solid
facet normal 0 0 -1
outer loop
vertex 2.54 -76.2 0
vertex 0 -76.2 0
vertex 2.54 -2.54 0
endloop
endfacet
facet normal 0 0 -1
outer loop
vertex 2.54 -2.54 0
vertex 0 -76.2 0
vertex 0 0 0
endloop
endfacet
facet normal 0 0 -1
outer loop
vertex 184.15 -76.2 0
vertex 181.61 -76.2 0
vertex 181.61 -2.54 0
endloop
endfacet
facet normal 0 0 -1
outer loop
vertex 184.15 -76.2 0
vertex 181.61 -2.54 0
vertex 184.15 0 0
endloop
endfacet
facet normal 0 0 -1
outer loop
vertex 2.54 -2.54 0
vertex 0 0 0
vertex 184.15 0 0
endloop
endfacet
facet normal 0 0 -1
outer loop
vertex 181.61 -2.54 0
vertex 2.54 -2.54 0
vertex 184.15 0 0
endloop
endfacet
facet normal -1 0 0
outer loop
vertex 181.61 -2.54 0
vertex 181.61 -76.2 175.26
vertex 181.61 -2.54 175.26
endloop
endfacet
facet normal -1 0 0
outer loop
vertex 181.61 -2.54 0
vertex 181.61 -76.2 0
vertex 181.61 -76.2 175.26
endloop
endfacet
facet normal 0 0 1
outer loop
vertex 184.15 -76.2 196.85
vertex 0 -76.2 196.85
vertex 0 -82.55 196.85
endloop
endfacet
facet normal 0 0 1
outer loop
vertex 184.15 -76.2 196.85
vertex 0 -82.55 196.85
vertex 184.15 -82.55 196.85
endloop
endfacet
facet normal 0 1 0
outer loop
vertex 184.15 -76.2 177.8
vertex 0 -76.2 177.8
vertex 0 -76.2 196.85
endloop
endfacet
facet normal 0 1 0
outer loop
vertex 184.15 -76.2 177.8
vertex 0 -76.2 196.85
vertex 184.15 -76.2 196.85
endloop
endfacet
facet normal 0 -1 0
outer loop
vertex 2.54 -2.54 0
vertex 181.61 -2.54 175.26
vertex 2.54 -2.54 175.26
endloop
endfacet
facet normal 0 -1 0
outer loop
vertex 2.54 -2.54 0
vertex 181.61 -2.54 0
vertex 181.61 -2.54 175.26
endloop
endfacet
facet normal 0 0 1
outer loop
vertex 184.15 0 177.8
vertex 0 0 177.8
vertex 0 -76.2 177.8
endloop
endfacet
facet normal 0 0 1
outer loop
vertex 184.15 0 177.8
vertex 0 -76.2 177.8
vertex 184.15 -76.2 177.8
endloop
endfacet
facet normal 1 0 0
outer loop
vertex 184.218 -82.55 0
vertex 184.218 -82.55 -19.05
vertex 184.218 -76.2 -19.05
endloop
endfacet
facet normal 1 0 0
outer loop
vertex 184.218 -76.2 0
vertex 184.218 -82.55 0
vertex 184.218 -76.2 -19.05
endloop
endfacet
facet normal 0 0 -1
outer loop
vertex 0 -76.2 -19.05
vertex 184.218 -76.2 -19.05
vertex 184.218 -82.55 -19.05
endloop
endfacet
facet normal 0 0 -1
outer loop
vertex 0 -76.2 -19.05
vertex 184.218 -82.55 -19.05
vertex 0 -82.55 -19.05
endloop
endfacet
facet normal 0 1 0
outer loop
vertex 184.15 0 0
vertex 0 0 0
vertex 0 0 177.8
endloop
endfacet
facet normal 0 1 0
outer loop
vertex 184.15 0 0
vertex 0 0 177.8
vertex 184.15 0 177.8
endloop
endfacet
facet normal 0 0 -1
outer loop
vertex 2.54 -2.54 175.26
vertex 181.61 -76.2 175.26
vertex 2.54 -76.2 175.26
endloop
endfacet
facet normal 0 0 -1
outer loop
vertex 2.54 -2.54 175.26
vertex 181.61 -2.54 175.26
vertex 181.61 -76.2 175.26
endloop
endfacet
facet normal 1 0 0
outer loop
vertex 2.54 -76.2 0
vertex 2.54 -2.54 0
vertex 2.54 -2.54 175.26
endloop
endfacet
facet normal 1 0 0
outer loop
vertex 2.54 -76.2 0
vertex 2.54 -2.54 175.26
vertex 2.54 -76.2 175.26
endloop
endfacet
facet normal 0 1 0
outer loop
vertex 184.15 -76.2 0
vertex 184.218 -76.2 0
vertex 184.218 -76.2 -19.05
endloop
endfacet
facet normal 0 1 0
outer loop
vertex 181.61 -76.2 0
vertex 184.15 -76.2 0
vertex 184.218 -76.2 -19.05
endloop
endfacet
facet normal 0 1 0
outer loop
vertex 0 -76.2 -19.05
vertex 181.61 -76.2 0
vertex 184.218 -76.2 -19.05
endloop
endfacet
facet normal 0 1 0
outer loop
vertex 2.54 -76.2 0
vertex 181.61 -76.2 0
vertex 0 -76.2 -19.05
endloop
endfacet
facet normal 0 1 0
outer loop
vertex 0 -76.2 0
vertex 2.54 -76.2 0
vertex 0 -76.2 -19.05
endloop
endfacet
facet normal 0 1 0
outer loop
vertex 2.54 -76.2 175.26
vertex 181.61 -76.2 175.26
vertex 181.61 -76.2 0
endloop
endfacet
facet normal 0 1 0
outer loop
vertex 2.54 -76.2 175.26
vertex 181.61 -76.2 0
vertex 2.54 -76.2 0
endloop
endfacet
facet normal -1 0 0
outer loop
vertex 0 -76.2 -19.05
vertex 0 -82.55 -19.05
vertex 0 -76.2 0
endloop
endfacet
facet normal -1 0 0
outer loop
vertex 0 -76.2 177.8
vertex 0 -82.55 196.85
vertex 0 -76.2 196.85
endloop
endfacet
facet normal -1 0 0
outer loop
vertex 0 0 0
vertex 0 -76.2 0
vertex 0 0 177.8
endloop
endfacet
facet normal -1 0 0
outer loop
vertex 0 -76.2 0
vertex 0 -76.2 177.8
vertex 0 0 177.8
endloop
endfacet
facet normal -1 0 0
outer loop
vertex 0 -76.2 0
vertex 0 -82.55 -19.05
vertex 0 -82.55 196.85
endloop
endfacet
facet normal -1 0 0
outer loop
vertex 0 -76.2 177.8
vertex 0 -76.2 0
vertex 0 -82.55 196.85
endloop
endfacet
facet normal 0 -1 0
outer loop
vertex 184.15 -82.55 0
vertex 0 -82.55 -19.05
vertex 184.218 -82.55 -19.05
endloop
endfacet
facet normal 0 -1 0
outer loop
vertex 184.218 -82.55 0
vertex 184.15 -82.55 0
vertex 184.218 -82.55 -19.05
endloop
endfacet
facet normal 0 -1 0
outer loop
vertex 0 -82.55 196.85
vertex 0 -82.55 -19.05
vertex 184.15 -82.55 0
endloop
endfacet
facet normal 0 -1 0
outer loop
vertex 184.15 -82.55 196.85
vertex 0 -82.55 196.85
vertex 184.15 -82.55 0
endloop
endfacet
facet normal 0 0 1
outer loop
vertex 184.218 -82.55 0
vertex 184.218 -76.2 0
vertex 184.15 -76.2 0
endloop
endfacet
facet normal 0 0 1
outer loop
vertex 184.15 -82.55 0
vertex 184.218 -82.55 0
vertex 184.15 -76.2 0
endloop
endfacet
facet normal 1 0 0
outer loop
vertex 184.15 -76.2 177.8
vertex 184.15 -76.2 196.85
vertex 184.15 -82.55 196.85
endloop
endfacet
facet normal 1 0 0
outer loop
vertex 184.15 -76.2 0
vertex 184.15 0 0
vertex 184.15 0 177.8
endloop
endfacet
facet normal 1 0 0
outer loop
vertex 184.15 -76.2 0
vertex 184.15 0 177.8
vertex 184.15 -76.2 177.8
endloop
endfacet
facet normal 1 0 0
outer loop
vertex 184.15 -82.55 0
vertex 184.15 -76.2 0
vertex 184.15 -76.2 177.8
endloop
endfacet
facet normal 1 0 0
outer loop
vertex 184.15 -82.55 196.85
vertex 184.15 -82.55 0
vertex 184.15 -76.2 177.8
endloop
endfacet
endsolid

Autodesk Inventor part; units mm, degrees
ref_plane "YZ Plane" through (0, 0, 0) normal (1, 0, 0) x (0, 1, 0)
ref_plane "XZ Plane" through (0, 0, 0) normal (0, 1, 0) x (-1, 0, 0)
ref_plane "XY Plane" through (0, 0, 0) normal (0, 0, 1) x (1, 0, 0)
sketch "Sketch1" plane through (0, 0, 0) normal (0, 0, 1) x (1, 0, 0)
  line L0 (0, 0) -> (184.15, 0)
  line L1 (184.15, 0) -> (184.15, -107.95)
  line L2 (184.15, -107.95) -> (0, -107.95)
  line L3 (0, -107.95) -> (0, 0)
  dimension "d0" = 107.95
  dimension "d1" = 184.15
extrude "Extrusion1" add sketch "Sketch1" along normal blind 177.8
sketch "Sketch2" plane through (0, 0, 177.8) normal (0, 0, 1) x (1, 0, 0)
  line L0 (0, 0) -> (0, -107.95) projected
  line L1 (184.15, -107.95) -> (184.15, 0) projected
  line L2 (0, -76.2) -> (184.15, -76.2)
  line L3 (184.15, -76.2) -> (184.15, -82.55)
  line L4 (184.15, -82.55) -> (0, -82.55)
  line L5 (0, -82.55) -> (0, -76.2)
  line L6 (0, -107.95) -> (184.15, -107.95) projected
  dimension "d4" = 6.35
  dimension "d5" = 25.4
extrude "Extrusion2" add sketch "Sketch2" along normal blind 19.05 contours L2 L1 L4 L0
sketch "Sketch3" plane through (0, 0, 0) normal (0, 0, -1) x (-1, 0, 0)
  line L0 (0, -107.95) -> (0, 0) projected
  line L1 (-184.2181, -76.2) -> (0, -76.2)
  line L2 (0, -76.2) -> (0, -82.55)
  line L3 (0, -82.55) -> (-184.2181, -82.55)
  line L4 (-184.2181, -82.55) -> (-184.2181, -76.2)
  line L5 (-184.15, -107.95) -> (0, -107.95) projected
  line L6 (0, 0) -> (-184.15, 0) projected
  dimension "d8" = 25.4
  dimension "d9" = 76.2
extrude "Extrusion3" add sketch "Sketch3" along normal blind 19.05
sketch "Sketch4" plane through (184.15, 0, 177.8) normal (1, 0, 0) x (0, 0, -1)
  line L0 (177.8, -76.2) -> (177.8, -82.55)
  line L1 (177.8, -76.2) -> (196.85, -76.2) projected
  point P0 (177.8, 0)
  point P1 (0, -82.55)
  point P2 (0, -76.2)
sketch "Sketch5" plane through (184.15, 0, 177.8) normal (1, 0, 0) x (0, 0, -1)
  point P0 (177.8, 0)
sketch "Sketch6" plane through (0, 0, 0) normal (0, 0, -1) x (-1, 0, 0)
  line L0 (-181.61, -2.54) -> (-2.54, -2.54)
  line L1 (-2.54, -2.54) -> (-2.54, -76.2)
  line L2 (-2.54, -76.2) -> (-181.61, -76.2)
  line L3 (-181.61, -76.2) -> (-181.61, -2.54)
  line L4 (0, 0) -> (-184.15, 0) projected
  line L5 (0, -76.2) -> (0, 0) projected
  line L6 (-184.15, 0) -> (-184.15, -76.2) projected
  line L7 (0, -76.2) -> (-184.2181, -76.2) projected
  dimension "d12" = 2.54
  dimension "d13" = 2.54
  dimension "d14" = 2.54
  dimension "d15" = 0
extrude "Extrusion4" cut sketch "Sketch6" against normal blind 175.26 contours L0 L1 L2 L3
sketch "Sketch7" plane through (0, 0, 0) normal (0, 0, -1) x (-1, 0, 0)
  point P0 (0, 0)
sketch "Sketch8" plane through (0, 0, 0) normal (0, 0, -1) x (-1, 0, 0)
  line L0 (0, -82.55) -> (-184.15, -82.55) projected
  line L1 (-184.15, -82.55) -> (-184.15, -107.95) projected
  line L2 (-184.15, -107.95) -> (0, -107.95) projected
  line L3 (0, -107.95) -> (0, -82.55) projected
  point P0 (0, 0)
extrude "Extrusion5" cut sketch "Sketch8" against normal blind 177.8
properties part number "robotics battery box"
